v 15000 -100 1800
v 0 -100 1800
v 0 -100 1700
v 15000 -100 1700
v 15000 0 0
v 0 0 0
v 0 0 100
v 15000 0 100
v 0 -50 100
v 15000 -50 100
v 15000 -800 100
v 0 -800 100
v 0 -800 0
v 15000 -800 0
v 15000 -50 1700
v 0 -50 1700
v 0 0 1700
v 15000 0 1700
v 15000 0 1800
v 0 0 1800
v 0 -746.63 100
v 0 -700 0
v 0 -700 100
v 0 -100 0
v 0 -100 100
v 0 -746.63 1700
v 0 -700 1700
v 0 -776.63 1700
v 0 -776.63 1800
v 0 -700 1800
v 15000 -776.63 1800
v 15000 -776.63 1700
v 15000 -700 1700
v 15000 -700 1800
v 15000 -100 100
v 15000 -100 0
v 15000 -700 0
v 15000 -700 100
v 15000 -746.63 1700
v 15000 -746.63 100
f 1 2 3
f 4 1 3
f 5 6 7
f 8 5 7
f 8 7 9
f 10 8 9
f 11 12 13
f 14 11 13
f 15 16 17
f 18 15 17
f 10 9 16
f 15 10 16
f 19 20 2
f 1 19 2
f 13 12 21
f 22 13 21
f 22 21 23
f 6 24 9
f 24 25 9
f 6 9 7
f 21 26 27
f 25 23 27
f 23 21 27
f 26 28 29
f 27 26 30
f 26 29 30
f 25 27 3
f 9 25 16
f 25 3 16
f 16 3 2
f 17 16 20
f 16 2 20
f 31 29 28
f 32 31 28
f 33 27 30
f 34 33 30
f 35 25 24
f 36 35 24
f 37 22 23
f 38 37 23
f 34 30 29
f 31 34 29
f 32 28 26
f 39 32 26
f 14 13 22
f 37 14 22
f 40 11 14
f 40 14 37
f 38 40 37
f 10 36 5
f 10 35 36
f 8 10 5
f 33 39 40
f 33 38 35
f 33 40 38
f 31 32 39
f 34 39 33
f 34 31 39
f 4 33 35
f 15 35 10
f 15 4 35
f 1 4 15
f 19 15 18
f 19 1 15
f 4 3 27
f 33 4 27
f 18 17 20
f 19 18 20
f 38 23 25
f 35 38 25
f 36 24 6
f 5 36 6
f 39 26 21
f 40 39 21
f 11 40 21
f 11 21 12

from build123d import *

# Parameters (mm, degrees)
F1_DEPTH = 15000


with BuildPart() as f1:
    # F0 (on Right) → F1 (new body)
    with BuildSketch(Plane.YZ):
        Polygon((-100, 0), (0, 0), (0, 100), (-50, 100), (-50, 1700), (0, 1700), (0, 1800), (-100, 1800), (-100, 1700), (-700, 1700), (-700, 1800), (-776.63, 1800), (-776.63, 1700), (-746.63, 1700), (-746.63, 100), (-800, 100), (-800, 0), (-700, 0), (-700, 100), (-100, 100), align=None)
    extrude(amount=F1_DEPTH)


solid = f1.part
